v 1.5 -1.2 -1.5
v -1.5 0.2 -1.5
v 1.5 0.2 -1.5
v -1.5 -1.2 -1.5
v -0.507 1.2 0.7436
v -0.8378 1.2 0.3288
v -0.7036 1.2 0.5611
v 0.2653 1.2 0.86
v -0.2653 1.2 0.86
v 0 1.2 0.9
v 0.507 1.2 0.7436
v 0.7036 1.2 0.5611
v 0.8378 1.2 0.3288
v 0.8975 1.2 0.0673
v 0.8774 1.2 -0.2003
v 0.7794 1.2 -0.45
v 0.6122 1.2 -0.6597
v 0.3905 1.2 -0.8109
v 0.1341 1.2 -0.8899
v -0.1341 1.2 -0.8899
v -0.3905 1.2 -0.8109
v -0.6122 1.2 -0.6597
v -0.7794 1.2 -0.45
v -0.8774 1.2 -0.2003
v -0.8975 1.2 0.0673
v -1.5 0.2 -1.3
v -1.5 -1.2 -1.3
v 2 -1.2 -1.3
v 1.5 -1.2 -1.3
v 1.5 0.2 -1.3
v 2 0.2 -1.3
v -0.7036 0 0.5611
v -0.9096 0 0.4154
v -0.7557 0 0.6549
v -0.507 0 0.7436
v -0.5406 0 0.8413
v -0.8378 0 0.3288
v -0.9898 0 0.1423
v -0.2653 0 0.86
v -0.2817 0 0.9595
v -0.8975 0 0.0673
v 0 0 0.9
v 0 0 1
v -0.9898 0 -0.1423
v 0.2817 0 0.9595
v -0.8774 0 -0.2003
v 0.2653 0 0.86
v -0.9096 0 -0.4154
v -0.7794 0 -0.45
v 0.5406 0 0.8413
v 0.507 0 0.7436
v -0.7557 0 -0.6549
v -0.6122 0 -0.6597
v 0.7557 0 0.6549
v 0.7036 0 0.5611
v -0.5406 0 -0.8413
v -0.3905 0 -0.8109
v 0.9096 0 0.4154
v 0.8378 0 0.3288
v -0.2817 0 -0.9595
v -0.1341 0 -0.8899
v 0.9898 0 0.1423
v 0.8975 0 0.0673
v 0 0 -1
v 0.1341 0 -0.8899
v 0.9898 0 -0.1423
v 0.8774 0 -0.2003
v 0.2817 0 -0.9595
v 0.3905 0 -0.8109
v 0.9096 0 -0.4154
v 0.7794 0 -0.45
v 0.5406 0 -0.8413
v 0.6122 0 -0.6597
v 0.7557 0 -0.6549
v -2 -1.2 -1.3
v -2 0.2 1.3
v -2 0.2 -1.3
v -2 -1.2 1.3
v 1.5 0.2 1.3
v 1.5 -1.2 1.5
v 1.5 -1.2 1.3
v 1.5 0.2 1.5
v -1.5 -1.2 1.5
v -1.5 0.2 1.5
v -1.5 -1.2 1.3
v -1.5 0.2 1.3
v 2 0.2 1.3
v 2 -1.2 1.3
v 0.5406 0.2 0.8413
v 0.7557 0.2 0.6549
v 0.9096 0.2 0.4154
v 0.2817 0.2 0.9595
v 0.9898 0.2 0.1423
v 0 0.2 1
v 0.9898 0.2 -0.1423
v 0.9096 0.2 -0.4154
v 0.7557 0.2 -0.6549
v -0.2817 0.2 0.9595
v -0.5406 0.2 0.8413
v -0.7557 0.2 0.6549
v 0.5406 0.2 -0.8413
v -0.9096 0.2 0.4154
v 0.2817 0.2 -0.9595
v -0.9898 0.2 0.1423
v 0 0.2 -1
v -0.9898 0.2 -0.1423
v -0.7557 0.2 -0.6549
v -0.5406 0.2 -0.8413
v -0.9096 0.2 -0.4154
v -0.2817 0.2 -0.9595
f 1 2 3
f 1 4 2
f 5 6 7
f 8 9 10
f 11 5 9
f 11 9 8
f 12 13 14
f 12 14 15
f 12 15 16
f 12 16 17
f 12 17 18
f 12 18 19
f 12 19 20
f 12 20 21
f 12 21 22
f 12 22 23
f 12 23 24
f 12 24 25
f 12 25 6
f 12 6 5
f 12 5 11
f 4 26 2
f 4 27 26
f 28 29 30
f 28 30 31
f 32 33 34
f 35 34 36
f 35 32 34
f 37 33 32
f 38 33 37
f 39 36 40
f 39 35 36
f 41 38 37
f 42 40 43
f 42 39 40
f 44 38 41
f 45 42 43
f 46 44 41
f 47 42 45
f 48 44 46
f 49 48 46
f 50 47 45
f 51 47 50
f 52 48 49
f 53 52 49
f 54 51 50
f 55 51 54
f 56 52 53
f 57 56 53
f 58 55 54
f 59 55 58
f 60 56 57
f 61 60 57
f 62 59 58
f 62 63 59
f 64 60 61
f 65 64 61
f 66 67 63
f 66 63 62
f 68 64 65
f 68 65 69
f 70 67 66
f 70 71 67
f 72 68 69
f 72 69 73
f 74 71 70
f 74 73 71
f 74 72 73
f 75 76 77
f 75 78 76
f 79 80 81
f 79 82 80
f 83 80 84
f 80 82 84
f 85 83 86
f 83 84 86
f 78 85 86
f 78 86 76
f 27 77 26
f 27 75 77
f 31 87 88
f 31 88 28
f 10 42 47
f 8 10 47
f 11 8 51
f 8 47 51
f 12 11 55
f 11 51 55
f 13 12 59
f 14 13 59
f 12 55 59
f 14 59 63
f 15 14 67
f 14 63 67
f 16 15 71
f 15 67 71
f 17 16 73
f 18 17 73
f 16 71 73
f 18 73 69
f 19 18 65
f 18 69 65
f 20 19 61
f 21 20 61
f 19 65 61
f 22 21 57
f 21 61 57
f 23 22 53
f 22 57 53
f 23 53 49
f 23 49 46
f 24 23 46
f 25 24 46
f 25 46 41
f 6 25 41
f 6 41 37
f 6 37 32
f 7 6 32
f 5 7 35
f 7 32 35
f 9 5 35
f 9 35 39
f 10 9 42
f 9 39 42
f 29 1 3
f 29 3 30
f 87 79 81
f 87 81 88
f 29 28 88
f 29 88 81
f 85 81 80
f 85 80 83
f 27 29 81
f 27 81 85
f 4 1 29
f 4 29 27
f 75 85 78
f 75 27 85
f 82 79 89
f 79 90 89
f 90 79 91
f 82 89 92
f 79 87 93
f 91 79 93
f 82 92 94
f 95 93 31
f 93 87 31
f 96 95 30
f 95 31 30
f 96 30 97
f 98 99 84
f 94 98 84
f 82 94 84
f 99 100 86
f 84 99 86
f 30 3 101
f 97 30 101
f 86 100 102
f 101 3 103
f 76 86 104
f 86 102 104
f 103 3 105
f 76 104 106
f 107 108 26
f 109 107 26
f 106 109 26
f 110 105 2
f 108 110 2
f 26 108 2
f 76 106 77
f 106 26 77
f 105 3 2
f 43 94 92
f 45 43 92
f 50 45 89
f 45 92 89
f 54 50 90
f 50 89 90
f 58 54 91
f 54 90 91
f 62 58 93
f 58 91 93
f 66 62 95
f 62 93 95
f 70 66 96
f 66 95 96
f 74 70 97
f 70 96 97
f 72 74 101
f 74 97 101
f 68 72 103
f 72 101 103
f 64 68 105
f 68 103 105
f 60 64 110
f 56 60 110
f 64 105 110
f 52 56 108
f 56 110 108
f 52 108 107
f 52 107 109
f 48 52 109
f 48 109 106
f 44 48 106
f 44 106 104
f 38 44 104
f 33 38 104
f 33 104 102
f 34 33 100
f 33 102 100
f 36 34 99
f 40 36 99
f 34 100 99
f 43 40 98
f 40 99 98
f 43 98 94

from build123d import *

# Parameters (mm, degrees)
SKETCH1_W           = 4
SKETCH1_H           = 2.6
BOSS_EXTRUDE1_DEPTH = 1.2
BOSS_EXTRUDE2_DEPTH = 0.2
SKETCH3_W           = 3
SKETCH3_H           = 0.2
BOSS_EXTRUDE3_DEPTH = 1.2
SKETCH4_R           = 1
CUT_EXTRUDE1_DEPTH  = 0.2
SKETCH5_R           = 0.9
BOSS_EXTRUDE4_DEPTH = 1.2


with BuildPart() as part:
    # Sketch1 → Boss-Extrude1 (new body)
    with BuildSketch(Plane(origin=(0, 0, 0), x_dir=(1, 0, 0), z_dir=(0, 1, 0))):
        Rectangle(SKETCH1_W, SKETCH1_H)
    extrude(amount=-BOSS_EXTRUDE1_DEPTH)



with BuildPart() as body_2:
    # Sketch2 → Boss-Extrude2 (new body)
    with BuildSketch(Plane(origin=(0, 0, 0), x_dir=(1, 0, 0), z_dir=(0, 1, 0))):
        Polygon((-1.5, 1.5), (1.5, 1.5), (1.5, 1.3), (2, 1.3), (2, -1.3), (1.5, -1.3), (1.5, -1.5), (-1.5, -1.5), (-1.5, -1.3), (-2, -1.3), (-2, 1.3), (-1.5, 1.3), align=None)
    extrude(amount=BOSS_EXTRUDE2_DEPTH)

    # Sketch3 → Boss-Extrude3 (add)
    with BuildSketch(Plane(origin=(0, 0, 0), x_dir=(-1, 0, 0), z_dir=(0, -1, 0))):
        with Locations((0, -1.4)):
            Rectangle(SKETCH3_W, SKETCH3_H)
        with Locations((0, 1.4)):
            Rectangle(SKETCH3_W, SKETCH3_H)
    extrude(amount=BOSS_EXTRUDE3_DEPTH)

    # Sketch4 → Cut-Extrude1 (cut)
    with BuildSketch(Plane(origin=(0, 0.2, 0), x_dir=(1, 0, 0), z_dir=(0, 1, 0))):
        with Locations(Location((0, 0, 0), (0, 0, 270))):
            Circle(SKETCH4_R)
    extrude(amount=-CUT_EXTRUDE1_DEPTH, mode=Mode.SUBTRACT)


with BuildPart() as part_1:
    add(part.part)

    add(body_2.part)  # Boss-Extrude4 merges body 2
    # Sketch5 → Boss-Extrude4 (add)
    with BuildSketch(Plane(origin=(0, 0, 0), x_dir=(1, 0, 0), z_dir=(0, 1, 0))):
        with Locations(Location((0, 0, 0), (0, 0, 270))):
            Circle(SKETCH5_R)
    extrude(amount=BOSS_EXTRUDE4_DEPTH)


solid = part_1.part
